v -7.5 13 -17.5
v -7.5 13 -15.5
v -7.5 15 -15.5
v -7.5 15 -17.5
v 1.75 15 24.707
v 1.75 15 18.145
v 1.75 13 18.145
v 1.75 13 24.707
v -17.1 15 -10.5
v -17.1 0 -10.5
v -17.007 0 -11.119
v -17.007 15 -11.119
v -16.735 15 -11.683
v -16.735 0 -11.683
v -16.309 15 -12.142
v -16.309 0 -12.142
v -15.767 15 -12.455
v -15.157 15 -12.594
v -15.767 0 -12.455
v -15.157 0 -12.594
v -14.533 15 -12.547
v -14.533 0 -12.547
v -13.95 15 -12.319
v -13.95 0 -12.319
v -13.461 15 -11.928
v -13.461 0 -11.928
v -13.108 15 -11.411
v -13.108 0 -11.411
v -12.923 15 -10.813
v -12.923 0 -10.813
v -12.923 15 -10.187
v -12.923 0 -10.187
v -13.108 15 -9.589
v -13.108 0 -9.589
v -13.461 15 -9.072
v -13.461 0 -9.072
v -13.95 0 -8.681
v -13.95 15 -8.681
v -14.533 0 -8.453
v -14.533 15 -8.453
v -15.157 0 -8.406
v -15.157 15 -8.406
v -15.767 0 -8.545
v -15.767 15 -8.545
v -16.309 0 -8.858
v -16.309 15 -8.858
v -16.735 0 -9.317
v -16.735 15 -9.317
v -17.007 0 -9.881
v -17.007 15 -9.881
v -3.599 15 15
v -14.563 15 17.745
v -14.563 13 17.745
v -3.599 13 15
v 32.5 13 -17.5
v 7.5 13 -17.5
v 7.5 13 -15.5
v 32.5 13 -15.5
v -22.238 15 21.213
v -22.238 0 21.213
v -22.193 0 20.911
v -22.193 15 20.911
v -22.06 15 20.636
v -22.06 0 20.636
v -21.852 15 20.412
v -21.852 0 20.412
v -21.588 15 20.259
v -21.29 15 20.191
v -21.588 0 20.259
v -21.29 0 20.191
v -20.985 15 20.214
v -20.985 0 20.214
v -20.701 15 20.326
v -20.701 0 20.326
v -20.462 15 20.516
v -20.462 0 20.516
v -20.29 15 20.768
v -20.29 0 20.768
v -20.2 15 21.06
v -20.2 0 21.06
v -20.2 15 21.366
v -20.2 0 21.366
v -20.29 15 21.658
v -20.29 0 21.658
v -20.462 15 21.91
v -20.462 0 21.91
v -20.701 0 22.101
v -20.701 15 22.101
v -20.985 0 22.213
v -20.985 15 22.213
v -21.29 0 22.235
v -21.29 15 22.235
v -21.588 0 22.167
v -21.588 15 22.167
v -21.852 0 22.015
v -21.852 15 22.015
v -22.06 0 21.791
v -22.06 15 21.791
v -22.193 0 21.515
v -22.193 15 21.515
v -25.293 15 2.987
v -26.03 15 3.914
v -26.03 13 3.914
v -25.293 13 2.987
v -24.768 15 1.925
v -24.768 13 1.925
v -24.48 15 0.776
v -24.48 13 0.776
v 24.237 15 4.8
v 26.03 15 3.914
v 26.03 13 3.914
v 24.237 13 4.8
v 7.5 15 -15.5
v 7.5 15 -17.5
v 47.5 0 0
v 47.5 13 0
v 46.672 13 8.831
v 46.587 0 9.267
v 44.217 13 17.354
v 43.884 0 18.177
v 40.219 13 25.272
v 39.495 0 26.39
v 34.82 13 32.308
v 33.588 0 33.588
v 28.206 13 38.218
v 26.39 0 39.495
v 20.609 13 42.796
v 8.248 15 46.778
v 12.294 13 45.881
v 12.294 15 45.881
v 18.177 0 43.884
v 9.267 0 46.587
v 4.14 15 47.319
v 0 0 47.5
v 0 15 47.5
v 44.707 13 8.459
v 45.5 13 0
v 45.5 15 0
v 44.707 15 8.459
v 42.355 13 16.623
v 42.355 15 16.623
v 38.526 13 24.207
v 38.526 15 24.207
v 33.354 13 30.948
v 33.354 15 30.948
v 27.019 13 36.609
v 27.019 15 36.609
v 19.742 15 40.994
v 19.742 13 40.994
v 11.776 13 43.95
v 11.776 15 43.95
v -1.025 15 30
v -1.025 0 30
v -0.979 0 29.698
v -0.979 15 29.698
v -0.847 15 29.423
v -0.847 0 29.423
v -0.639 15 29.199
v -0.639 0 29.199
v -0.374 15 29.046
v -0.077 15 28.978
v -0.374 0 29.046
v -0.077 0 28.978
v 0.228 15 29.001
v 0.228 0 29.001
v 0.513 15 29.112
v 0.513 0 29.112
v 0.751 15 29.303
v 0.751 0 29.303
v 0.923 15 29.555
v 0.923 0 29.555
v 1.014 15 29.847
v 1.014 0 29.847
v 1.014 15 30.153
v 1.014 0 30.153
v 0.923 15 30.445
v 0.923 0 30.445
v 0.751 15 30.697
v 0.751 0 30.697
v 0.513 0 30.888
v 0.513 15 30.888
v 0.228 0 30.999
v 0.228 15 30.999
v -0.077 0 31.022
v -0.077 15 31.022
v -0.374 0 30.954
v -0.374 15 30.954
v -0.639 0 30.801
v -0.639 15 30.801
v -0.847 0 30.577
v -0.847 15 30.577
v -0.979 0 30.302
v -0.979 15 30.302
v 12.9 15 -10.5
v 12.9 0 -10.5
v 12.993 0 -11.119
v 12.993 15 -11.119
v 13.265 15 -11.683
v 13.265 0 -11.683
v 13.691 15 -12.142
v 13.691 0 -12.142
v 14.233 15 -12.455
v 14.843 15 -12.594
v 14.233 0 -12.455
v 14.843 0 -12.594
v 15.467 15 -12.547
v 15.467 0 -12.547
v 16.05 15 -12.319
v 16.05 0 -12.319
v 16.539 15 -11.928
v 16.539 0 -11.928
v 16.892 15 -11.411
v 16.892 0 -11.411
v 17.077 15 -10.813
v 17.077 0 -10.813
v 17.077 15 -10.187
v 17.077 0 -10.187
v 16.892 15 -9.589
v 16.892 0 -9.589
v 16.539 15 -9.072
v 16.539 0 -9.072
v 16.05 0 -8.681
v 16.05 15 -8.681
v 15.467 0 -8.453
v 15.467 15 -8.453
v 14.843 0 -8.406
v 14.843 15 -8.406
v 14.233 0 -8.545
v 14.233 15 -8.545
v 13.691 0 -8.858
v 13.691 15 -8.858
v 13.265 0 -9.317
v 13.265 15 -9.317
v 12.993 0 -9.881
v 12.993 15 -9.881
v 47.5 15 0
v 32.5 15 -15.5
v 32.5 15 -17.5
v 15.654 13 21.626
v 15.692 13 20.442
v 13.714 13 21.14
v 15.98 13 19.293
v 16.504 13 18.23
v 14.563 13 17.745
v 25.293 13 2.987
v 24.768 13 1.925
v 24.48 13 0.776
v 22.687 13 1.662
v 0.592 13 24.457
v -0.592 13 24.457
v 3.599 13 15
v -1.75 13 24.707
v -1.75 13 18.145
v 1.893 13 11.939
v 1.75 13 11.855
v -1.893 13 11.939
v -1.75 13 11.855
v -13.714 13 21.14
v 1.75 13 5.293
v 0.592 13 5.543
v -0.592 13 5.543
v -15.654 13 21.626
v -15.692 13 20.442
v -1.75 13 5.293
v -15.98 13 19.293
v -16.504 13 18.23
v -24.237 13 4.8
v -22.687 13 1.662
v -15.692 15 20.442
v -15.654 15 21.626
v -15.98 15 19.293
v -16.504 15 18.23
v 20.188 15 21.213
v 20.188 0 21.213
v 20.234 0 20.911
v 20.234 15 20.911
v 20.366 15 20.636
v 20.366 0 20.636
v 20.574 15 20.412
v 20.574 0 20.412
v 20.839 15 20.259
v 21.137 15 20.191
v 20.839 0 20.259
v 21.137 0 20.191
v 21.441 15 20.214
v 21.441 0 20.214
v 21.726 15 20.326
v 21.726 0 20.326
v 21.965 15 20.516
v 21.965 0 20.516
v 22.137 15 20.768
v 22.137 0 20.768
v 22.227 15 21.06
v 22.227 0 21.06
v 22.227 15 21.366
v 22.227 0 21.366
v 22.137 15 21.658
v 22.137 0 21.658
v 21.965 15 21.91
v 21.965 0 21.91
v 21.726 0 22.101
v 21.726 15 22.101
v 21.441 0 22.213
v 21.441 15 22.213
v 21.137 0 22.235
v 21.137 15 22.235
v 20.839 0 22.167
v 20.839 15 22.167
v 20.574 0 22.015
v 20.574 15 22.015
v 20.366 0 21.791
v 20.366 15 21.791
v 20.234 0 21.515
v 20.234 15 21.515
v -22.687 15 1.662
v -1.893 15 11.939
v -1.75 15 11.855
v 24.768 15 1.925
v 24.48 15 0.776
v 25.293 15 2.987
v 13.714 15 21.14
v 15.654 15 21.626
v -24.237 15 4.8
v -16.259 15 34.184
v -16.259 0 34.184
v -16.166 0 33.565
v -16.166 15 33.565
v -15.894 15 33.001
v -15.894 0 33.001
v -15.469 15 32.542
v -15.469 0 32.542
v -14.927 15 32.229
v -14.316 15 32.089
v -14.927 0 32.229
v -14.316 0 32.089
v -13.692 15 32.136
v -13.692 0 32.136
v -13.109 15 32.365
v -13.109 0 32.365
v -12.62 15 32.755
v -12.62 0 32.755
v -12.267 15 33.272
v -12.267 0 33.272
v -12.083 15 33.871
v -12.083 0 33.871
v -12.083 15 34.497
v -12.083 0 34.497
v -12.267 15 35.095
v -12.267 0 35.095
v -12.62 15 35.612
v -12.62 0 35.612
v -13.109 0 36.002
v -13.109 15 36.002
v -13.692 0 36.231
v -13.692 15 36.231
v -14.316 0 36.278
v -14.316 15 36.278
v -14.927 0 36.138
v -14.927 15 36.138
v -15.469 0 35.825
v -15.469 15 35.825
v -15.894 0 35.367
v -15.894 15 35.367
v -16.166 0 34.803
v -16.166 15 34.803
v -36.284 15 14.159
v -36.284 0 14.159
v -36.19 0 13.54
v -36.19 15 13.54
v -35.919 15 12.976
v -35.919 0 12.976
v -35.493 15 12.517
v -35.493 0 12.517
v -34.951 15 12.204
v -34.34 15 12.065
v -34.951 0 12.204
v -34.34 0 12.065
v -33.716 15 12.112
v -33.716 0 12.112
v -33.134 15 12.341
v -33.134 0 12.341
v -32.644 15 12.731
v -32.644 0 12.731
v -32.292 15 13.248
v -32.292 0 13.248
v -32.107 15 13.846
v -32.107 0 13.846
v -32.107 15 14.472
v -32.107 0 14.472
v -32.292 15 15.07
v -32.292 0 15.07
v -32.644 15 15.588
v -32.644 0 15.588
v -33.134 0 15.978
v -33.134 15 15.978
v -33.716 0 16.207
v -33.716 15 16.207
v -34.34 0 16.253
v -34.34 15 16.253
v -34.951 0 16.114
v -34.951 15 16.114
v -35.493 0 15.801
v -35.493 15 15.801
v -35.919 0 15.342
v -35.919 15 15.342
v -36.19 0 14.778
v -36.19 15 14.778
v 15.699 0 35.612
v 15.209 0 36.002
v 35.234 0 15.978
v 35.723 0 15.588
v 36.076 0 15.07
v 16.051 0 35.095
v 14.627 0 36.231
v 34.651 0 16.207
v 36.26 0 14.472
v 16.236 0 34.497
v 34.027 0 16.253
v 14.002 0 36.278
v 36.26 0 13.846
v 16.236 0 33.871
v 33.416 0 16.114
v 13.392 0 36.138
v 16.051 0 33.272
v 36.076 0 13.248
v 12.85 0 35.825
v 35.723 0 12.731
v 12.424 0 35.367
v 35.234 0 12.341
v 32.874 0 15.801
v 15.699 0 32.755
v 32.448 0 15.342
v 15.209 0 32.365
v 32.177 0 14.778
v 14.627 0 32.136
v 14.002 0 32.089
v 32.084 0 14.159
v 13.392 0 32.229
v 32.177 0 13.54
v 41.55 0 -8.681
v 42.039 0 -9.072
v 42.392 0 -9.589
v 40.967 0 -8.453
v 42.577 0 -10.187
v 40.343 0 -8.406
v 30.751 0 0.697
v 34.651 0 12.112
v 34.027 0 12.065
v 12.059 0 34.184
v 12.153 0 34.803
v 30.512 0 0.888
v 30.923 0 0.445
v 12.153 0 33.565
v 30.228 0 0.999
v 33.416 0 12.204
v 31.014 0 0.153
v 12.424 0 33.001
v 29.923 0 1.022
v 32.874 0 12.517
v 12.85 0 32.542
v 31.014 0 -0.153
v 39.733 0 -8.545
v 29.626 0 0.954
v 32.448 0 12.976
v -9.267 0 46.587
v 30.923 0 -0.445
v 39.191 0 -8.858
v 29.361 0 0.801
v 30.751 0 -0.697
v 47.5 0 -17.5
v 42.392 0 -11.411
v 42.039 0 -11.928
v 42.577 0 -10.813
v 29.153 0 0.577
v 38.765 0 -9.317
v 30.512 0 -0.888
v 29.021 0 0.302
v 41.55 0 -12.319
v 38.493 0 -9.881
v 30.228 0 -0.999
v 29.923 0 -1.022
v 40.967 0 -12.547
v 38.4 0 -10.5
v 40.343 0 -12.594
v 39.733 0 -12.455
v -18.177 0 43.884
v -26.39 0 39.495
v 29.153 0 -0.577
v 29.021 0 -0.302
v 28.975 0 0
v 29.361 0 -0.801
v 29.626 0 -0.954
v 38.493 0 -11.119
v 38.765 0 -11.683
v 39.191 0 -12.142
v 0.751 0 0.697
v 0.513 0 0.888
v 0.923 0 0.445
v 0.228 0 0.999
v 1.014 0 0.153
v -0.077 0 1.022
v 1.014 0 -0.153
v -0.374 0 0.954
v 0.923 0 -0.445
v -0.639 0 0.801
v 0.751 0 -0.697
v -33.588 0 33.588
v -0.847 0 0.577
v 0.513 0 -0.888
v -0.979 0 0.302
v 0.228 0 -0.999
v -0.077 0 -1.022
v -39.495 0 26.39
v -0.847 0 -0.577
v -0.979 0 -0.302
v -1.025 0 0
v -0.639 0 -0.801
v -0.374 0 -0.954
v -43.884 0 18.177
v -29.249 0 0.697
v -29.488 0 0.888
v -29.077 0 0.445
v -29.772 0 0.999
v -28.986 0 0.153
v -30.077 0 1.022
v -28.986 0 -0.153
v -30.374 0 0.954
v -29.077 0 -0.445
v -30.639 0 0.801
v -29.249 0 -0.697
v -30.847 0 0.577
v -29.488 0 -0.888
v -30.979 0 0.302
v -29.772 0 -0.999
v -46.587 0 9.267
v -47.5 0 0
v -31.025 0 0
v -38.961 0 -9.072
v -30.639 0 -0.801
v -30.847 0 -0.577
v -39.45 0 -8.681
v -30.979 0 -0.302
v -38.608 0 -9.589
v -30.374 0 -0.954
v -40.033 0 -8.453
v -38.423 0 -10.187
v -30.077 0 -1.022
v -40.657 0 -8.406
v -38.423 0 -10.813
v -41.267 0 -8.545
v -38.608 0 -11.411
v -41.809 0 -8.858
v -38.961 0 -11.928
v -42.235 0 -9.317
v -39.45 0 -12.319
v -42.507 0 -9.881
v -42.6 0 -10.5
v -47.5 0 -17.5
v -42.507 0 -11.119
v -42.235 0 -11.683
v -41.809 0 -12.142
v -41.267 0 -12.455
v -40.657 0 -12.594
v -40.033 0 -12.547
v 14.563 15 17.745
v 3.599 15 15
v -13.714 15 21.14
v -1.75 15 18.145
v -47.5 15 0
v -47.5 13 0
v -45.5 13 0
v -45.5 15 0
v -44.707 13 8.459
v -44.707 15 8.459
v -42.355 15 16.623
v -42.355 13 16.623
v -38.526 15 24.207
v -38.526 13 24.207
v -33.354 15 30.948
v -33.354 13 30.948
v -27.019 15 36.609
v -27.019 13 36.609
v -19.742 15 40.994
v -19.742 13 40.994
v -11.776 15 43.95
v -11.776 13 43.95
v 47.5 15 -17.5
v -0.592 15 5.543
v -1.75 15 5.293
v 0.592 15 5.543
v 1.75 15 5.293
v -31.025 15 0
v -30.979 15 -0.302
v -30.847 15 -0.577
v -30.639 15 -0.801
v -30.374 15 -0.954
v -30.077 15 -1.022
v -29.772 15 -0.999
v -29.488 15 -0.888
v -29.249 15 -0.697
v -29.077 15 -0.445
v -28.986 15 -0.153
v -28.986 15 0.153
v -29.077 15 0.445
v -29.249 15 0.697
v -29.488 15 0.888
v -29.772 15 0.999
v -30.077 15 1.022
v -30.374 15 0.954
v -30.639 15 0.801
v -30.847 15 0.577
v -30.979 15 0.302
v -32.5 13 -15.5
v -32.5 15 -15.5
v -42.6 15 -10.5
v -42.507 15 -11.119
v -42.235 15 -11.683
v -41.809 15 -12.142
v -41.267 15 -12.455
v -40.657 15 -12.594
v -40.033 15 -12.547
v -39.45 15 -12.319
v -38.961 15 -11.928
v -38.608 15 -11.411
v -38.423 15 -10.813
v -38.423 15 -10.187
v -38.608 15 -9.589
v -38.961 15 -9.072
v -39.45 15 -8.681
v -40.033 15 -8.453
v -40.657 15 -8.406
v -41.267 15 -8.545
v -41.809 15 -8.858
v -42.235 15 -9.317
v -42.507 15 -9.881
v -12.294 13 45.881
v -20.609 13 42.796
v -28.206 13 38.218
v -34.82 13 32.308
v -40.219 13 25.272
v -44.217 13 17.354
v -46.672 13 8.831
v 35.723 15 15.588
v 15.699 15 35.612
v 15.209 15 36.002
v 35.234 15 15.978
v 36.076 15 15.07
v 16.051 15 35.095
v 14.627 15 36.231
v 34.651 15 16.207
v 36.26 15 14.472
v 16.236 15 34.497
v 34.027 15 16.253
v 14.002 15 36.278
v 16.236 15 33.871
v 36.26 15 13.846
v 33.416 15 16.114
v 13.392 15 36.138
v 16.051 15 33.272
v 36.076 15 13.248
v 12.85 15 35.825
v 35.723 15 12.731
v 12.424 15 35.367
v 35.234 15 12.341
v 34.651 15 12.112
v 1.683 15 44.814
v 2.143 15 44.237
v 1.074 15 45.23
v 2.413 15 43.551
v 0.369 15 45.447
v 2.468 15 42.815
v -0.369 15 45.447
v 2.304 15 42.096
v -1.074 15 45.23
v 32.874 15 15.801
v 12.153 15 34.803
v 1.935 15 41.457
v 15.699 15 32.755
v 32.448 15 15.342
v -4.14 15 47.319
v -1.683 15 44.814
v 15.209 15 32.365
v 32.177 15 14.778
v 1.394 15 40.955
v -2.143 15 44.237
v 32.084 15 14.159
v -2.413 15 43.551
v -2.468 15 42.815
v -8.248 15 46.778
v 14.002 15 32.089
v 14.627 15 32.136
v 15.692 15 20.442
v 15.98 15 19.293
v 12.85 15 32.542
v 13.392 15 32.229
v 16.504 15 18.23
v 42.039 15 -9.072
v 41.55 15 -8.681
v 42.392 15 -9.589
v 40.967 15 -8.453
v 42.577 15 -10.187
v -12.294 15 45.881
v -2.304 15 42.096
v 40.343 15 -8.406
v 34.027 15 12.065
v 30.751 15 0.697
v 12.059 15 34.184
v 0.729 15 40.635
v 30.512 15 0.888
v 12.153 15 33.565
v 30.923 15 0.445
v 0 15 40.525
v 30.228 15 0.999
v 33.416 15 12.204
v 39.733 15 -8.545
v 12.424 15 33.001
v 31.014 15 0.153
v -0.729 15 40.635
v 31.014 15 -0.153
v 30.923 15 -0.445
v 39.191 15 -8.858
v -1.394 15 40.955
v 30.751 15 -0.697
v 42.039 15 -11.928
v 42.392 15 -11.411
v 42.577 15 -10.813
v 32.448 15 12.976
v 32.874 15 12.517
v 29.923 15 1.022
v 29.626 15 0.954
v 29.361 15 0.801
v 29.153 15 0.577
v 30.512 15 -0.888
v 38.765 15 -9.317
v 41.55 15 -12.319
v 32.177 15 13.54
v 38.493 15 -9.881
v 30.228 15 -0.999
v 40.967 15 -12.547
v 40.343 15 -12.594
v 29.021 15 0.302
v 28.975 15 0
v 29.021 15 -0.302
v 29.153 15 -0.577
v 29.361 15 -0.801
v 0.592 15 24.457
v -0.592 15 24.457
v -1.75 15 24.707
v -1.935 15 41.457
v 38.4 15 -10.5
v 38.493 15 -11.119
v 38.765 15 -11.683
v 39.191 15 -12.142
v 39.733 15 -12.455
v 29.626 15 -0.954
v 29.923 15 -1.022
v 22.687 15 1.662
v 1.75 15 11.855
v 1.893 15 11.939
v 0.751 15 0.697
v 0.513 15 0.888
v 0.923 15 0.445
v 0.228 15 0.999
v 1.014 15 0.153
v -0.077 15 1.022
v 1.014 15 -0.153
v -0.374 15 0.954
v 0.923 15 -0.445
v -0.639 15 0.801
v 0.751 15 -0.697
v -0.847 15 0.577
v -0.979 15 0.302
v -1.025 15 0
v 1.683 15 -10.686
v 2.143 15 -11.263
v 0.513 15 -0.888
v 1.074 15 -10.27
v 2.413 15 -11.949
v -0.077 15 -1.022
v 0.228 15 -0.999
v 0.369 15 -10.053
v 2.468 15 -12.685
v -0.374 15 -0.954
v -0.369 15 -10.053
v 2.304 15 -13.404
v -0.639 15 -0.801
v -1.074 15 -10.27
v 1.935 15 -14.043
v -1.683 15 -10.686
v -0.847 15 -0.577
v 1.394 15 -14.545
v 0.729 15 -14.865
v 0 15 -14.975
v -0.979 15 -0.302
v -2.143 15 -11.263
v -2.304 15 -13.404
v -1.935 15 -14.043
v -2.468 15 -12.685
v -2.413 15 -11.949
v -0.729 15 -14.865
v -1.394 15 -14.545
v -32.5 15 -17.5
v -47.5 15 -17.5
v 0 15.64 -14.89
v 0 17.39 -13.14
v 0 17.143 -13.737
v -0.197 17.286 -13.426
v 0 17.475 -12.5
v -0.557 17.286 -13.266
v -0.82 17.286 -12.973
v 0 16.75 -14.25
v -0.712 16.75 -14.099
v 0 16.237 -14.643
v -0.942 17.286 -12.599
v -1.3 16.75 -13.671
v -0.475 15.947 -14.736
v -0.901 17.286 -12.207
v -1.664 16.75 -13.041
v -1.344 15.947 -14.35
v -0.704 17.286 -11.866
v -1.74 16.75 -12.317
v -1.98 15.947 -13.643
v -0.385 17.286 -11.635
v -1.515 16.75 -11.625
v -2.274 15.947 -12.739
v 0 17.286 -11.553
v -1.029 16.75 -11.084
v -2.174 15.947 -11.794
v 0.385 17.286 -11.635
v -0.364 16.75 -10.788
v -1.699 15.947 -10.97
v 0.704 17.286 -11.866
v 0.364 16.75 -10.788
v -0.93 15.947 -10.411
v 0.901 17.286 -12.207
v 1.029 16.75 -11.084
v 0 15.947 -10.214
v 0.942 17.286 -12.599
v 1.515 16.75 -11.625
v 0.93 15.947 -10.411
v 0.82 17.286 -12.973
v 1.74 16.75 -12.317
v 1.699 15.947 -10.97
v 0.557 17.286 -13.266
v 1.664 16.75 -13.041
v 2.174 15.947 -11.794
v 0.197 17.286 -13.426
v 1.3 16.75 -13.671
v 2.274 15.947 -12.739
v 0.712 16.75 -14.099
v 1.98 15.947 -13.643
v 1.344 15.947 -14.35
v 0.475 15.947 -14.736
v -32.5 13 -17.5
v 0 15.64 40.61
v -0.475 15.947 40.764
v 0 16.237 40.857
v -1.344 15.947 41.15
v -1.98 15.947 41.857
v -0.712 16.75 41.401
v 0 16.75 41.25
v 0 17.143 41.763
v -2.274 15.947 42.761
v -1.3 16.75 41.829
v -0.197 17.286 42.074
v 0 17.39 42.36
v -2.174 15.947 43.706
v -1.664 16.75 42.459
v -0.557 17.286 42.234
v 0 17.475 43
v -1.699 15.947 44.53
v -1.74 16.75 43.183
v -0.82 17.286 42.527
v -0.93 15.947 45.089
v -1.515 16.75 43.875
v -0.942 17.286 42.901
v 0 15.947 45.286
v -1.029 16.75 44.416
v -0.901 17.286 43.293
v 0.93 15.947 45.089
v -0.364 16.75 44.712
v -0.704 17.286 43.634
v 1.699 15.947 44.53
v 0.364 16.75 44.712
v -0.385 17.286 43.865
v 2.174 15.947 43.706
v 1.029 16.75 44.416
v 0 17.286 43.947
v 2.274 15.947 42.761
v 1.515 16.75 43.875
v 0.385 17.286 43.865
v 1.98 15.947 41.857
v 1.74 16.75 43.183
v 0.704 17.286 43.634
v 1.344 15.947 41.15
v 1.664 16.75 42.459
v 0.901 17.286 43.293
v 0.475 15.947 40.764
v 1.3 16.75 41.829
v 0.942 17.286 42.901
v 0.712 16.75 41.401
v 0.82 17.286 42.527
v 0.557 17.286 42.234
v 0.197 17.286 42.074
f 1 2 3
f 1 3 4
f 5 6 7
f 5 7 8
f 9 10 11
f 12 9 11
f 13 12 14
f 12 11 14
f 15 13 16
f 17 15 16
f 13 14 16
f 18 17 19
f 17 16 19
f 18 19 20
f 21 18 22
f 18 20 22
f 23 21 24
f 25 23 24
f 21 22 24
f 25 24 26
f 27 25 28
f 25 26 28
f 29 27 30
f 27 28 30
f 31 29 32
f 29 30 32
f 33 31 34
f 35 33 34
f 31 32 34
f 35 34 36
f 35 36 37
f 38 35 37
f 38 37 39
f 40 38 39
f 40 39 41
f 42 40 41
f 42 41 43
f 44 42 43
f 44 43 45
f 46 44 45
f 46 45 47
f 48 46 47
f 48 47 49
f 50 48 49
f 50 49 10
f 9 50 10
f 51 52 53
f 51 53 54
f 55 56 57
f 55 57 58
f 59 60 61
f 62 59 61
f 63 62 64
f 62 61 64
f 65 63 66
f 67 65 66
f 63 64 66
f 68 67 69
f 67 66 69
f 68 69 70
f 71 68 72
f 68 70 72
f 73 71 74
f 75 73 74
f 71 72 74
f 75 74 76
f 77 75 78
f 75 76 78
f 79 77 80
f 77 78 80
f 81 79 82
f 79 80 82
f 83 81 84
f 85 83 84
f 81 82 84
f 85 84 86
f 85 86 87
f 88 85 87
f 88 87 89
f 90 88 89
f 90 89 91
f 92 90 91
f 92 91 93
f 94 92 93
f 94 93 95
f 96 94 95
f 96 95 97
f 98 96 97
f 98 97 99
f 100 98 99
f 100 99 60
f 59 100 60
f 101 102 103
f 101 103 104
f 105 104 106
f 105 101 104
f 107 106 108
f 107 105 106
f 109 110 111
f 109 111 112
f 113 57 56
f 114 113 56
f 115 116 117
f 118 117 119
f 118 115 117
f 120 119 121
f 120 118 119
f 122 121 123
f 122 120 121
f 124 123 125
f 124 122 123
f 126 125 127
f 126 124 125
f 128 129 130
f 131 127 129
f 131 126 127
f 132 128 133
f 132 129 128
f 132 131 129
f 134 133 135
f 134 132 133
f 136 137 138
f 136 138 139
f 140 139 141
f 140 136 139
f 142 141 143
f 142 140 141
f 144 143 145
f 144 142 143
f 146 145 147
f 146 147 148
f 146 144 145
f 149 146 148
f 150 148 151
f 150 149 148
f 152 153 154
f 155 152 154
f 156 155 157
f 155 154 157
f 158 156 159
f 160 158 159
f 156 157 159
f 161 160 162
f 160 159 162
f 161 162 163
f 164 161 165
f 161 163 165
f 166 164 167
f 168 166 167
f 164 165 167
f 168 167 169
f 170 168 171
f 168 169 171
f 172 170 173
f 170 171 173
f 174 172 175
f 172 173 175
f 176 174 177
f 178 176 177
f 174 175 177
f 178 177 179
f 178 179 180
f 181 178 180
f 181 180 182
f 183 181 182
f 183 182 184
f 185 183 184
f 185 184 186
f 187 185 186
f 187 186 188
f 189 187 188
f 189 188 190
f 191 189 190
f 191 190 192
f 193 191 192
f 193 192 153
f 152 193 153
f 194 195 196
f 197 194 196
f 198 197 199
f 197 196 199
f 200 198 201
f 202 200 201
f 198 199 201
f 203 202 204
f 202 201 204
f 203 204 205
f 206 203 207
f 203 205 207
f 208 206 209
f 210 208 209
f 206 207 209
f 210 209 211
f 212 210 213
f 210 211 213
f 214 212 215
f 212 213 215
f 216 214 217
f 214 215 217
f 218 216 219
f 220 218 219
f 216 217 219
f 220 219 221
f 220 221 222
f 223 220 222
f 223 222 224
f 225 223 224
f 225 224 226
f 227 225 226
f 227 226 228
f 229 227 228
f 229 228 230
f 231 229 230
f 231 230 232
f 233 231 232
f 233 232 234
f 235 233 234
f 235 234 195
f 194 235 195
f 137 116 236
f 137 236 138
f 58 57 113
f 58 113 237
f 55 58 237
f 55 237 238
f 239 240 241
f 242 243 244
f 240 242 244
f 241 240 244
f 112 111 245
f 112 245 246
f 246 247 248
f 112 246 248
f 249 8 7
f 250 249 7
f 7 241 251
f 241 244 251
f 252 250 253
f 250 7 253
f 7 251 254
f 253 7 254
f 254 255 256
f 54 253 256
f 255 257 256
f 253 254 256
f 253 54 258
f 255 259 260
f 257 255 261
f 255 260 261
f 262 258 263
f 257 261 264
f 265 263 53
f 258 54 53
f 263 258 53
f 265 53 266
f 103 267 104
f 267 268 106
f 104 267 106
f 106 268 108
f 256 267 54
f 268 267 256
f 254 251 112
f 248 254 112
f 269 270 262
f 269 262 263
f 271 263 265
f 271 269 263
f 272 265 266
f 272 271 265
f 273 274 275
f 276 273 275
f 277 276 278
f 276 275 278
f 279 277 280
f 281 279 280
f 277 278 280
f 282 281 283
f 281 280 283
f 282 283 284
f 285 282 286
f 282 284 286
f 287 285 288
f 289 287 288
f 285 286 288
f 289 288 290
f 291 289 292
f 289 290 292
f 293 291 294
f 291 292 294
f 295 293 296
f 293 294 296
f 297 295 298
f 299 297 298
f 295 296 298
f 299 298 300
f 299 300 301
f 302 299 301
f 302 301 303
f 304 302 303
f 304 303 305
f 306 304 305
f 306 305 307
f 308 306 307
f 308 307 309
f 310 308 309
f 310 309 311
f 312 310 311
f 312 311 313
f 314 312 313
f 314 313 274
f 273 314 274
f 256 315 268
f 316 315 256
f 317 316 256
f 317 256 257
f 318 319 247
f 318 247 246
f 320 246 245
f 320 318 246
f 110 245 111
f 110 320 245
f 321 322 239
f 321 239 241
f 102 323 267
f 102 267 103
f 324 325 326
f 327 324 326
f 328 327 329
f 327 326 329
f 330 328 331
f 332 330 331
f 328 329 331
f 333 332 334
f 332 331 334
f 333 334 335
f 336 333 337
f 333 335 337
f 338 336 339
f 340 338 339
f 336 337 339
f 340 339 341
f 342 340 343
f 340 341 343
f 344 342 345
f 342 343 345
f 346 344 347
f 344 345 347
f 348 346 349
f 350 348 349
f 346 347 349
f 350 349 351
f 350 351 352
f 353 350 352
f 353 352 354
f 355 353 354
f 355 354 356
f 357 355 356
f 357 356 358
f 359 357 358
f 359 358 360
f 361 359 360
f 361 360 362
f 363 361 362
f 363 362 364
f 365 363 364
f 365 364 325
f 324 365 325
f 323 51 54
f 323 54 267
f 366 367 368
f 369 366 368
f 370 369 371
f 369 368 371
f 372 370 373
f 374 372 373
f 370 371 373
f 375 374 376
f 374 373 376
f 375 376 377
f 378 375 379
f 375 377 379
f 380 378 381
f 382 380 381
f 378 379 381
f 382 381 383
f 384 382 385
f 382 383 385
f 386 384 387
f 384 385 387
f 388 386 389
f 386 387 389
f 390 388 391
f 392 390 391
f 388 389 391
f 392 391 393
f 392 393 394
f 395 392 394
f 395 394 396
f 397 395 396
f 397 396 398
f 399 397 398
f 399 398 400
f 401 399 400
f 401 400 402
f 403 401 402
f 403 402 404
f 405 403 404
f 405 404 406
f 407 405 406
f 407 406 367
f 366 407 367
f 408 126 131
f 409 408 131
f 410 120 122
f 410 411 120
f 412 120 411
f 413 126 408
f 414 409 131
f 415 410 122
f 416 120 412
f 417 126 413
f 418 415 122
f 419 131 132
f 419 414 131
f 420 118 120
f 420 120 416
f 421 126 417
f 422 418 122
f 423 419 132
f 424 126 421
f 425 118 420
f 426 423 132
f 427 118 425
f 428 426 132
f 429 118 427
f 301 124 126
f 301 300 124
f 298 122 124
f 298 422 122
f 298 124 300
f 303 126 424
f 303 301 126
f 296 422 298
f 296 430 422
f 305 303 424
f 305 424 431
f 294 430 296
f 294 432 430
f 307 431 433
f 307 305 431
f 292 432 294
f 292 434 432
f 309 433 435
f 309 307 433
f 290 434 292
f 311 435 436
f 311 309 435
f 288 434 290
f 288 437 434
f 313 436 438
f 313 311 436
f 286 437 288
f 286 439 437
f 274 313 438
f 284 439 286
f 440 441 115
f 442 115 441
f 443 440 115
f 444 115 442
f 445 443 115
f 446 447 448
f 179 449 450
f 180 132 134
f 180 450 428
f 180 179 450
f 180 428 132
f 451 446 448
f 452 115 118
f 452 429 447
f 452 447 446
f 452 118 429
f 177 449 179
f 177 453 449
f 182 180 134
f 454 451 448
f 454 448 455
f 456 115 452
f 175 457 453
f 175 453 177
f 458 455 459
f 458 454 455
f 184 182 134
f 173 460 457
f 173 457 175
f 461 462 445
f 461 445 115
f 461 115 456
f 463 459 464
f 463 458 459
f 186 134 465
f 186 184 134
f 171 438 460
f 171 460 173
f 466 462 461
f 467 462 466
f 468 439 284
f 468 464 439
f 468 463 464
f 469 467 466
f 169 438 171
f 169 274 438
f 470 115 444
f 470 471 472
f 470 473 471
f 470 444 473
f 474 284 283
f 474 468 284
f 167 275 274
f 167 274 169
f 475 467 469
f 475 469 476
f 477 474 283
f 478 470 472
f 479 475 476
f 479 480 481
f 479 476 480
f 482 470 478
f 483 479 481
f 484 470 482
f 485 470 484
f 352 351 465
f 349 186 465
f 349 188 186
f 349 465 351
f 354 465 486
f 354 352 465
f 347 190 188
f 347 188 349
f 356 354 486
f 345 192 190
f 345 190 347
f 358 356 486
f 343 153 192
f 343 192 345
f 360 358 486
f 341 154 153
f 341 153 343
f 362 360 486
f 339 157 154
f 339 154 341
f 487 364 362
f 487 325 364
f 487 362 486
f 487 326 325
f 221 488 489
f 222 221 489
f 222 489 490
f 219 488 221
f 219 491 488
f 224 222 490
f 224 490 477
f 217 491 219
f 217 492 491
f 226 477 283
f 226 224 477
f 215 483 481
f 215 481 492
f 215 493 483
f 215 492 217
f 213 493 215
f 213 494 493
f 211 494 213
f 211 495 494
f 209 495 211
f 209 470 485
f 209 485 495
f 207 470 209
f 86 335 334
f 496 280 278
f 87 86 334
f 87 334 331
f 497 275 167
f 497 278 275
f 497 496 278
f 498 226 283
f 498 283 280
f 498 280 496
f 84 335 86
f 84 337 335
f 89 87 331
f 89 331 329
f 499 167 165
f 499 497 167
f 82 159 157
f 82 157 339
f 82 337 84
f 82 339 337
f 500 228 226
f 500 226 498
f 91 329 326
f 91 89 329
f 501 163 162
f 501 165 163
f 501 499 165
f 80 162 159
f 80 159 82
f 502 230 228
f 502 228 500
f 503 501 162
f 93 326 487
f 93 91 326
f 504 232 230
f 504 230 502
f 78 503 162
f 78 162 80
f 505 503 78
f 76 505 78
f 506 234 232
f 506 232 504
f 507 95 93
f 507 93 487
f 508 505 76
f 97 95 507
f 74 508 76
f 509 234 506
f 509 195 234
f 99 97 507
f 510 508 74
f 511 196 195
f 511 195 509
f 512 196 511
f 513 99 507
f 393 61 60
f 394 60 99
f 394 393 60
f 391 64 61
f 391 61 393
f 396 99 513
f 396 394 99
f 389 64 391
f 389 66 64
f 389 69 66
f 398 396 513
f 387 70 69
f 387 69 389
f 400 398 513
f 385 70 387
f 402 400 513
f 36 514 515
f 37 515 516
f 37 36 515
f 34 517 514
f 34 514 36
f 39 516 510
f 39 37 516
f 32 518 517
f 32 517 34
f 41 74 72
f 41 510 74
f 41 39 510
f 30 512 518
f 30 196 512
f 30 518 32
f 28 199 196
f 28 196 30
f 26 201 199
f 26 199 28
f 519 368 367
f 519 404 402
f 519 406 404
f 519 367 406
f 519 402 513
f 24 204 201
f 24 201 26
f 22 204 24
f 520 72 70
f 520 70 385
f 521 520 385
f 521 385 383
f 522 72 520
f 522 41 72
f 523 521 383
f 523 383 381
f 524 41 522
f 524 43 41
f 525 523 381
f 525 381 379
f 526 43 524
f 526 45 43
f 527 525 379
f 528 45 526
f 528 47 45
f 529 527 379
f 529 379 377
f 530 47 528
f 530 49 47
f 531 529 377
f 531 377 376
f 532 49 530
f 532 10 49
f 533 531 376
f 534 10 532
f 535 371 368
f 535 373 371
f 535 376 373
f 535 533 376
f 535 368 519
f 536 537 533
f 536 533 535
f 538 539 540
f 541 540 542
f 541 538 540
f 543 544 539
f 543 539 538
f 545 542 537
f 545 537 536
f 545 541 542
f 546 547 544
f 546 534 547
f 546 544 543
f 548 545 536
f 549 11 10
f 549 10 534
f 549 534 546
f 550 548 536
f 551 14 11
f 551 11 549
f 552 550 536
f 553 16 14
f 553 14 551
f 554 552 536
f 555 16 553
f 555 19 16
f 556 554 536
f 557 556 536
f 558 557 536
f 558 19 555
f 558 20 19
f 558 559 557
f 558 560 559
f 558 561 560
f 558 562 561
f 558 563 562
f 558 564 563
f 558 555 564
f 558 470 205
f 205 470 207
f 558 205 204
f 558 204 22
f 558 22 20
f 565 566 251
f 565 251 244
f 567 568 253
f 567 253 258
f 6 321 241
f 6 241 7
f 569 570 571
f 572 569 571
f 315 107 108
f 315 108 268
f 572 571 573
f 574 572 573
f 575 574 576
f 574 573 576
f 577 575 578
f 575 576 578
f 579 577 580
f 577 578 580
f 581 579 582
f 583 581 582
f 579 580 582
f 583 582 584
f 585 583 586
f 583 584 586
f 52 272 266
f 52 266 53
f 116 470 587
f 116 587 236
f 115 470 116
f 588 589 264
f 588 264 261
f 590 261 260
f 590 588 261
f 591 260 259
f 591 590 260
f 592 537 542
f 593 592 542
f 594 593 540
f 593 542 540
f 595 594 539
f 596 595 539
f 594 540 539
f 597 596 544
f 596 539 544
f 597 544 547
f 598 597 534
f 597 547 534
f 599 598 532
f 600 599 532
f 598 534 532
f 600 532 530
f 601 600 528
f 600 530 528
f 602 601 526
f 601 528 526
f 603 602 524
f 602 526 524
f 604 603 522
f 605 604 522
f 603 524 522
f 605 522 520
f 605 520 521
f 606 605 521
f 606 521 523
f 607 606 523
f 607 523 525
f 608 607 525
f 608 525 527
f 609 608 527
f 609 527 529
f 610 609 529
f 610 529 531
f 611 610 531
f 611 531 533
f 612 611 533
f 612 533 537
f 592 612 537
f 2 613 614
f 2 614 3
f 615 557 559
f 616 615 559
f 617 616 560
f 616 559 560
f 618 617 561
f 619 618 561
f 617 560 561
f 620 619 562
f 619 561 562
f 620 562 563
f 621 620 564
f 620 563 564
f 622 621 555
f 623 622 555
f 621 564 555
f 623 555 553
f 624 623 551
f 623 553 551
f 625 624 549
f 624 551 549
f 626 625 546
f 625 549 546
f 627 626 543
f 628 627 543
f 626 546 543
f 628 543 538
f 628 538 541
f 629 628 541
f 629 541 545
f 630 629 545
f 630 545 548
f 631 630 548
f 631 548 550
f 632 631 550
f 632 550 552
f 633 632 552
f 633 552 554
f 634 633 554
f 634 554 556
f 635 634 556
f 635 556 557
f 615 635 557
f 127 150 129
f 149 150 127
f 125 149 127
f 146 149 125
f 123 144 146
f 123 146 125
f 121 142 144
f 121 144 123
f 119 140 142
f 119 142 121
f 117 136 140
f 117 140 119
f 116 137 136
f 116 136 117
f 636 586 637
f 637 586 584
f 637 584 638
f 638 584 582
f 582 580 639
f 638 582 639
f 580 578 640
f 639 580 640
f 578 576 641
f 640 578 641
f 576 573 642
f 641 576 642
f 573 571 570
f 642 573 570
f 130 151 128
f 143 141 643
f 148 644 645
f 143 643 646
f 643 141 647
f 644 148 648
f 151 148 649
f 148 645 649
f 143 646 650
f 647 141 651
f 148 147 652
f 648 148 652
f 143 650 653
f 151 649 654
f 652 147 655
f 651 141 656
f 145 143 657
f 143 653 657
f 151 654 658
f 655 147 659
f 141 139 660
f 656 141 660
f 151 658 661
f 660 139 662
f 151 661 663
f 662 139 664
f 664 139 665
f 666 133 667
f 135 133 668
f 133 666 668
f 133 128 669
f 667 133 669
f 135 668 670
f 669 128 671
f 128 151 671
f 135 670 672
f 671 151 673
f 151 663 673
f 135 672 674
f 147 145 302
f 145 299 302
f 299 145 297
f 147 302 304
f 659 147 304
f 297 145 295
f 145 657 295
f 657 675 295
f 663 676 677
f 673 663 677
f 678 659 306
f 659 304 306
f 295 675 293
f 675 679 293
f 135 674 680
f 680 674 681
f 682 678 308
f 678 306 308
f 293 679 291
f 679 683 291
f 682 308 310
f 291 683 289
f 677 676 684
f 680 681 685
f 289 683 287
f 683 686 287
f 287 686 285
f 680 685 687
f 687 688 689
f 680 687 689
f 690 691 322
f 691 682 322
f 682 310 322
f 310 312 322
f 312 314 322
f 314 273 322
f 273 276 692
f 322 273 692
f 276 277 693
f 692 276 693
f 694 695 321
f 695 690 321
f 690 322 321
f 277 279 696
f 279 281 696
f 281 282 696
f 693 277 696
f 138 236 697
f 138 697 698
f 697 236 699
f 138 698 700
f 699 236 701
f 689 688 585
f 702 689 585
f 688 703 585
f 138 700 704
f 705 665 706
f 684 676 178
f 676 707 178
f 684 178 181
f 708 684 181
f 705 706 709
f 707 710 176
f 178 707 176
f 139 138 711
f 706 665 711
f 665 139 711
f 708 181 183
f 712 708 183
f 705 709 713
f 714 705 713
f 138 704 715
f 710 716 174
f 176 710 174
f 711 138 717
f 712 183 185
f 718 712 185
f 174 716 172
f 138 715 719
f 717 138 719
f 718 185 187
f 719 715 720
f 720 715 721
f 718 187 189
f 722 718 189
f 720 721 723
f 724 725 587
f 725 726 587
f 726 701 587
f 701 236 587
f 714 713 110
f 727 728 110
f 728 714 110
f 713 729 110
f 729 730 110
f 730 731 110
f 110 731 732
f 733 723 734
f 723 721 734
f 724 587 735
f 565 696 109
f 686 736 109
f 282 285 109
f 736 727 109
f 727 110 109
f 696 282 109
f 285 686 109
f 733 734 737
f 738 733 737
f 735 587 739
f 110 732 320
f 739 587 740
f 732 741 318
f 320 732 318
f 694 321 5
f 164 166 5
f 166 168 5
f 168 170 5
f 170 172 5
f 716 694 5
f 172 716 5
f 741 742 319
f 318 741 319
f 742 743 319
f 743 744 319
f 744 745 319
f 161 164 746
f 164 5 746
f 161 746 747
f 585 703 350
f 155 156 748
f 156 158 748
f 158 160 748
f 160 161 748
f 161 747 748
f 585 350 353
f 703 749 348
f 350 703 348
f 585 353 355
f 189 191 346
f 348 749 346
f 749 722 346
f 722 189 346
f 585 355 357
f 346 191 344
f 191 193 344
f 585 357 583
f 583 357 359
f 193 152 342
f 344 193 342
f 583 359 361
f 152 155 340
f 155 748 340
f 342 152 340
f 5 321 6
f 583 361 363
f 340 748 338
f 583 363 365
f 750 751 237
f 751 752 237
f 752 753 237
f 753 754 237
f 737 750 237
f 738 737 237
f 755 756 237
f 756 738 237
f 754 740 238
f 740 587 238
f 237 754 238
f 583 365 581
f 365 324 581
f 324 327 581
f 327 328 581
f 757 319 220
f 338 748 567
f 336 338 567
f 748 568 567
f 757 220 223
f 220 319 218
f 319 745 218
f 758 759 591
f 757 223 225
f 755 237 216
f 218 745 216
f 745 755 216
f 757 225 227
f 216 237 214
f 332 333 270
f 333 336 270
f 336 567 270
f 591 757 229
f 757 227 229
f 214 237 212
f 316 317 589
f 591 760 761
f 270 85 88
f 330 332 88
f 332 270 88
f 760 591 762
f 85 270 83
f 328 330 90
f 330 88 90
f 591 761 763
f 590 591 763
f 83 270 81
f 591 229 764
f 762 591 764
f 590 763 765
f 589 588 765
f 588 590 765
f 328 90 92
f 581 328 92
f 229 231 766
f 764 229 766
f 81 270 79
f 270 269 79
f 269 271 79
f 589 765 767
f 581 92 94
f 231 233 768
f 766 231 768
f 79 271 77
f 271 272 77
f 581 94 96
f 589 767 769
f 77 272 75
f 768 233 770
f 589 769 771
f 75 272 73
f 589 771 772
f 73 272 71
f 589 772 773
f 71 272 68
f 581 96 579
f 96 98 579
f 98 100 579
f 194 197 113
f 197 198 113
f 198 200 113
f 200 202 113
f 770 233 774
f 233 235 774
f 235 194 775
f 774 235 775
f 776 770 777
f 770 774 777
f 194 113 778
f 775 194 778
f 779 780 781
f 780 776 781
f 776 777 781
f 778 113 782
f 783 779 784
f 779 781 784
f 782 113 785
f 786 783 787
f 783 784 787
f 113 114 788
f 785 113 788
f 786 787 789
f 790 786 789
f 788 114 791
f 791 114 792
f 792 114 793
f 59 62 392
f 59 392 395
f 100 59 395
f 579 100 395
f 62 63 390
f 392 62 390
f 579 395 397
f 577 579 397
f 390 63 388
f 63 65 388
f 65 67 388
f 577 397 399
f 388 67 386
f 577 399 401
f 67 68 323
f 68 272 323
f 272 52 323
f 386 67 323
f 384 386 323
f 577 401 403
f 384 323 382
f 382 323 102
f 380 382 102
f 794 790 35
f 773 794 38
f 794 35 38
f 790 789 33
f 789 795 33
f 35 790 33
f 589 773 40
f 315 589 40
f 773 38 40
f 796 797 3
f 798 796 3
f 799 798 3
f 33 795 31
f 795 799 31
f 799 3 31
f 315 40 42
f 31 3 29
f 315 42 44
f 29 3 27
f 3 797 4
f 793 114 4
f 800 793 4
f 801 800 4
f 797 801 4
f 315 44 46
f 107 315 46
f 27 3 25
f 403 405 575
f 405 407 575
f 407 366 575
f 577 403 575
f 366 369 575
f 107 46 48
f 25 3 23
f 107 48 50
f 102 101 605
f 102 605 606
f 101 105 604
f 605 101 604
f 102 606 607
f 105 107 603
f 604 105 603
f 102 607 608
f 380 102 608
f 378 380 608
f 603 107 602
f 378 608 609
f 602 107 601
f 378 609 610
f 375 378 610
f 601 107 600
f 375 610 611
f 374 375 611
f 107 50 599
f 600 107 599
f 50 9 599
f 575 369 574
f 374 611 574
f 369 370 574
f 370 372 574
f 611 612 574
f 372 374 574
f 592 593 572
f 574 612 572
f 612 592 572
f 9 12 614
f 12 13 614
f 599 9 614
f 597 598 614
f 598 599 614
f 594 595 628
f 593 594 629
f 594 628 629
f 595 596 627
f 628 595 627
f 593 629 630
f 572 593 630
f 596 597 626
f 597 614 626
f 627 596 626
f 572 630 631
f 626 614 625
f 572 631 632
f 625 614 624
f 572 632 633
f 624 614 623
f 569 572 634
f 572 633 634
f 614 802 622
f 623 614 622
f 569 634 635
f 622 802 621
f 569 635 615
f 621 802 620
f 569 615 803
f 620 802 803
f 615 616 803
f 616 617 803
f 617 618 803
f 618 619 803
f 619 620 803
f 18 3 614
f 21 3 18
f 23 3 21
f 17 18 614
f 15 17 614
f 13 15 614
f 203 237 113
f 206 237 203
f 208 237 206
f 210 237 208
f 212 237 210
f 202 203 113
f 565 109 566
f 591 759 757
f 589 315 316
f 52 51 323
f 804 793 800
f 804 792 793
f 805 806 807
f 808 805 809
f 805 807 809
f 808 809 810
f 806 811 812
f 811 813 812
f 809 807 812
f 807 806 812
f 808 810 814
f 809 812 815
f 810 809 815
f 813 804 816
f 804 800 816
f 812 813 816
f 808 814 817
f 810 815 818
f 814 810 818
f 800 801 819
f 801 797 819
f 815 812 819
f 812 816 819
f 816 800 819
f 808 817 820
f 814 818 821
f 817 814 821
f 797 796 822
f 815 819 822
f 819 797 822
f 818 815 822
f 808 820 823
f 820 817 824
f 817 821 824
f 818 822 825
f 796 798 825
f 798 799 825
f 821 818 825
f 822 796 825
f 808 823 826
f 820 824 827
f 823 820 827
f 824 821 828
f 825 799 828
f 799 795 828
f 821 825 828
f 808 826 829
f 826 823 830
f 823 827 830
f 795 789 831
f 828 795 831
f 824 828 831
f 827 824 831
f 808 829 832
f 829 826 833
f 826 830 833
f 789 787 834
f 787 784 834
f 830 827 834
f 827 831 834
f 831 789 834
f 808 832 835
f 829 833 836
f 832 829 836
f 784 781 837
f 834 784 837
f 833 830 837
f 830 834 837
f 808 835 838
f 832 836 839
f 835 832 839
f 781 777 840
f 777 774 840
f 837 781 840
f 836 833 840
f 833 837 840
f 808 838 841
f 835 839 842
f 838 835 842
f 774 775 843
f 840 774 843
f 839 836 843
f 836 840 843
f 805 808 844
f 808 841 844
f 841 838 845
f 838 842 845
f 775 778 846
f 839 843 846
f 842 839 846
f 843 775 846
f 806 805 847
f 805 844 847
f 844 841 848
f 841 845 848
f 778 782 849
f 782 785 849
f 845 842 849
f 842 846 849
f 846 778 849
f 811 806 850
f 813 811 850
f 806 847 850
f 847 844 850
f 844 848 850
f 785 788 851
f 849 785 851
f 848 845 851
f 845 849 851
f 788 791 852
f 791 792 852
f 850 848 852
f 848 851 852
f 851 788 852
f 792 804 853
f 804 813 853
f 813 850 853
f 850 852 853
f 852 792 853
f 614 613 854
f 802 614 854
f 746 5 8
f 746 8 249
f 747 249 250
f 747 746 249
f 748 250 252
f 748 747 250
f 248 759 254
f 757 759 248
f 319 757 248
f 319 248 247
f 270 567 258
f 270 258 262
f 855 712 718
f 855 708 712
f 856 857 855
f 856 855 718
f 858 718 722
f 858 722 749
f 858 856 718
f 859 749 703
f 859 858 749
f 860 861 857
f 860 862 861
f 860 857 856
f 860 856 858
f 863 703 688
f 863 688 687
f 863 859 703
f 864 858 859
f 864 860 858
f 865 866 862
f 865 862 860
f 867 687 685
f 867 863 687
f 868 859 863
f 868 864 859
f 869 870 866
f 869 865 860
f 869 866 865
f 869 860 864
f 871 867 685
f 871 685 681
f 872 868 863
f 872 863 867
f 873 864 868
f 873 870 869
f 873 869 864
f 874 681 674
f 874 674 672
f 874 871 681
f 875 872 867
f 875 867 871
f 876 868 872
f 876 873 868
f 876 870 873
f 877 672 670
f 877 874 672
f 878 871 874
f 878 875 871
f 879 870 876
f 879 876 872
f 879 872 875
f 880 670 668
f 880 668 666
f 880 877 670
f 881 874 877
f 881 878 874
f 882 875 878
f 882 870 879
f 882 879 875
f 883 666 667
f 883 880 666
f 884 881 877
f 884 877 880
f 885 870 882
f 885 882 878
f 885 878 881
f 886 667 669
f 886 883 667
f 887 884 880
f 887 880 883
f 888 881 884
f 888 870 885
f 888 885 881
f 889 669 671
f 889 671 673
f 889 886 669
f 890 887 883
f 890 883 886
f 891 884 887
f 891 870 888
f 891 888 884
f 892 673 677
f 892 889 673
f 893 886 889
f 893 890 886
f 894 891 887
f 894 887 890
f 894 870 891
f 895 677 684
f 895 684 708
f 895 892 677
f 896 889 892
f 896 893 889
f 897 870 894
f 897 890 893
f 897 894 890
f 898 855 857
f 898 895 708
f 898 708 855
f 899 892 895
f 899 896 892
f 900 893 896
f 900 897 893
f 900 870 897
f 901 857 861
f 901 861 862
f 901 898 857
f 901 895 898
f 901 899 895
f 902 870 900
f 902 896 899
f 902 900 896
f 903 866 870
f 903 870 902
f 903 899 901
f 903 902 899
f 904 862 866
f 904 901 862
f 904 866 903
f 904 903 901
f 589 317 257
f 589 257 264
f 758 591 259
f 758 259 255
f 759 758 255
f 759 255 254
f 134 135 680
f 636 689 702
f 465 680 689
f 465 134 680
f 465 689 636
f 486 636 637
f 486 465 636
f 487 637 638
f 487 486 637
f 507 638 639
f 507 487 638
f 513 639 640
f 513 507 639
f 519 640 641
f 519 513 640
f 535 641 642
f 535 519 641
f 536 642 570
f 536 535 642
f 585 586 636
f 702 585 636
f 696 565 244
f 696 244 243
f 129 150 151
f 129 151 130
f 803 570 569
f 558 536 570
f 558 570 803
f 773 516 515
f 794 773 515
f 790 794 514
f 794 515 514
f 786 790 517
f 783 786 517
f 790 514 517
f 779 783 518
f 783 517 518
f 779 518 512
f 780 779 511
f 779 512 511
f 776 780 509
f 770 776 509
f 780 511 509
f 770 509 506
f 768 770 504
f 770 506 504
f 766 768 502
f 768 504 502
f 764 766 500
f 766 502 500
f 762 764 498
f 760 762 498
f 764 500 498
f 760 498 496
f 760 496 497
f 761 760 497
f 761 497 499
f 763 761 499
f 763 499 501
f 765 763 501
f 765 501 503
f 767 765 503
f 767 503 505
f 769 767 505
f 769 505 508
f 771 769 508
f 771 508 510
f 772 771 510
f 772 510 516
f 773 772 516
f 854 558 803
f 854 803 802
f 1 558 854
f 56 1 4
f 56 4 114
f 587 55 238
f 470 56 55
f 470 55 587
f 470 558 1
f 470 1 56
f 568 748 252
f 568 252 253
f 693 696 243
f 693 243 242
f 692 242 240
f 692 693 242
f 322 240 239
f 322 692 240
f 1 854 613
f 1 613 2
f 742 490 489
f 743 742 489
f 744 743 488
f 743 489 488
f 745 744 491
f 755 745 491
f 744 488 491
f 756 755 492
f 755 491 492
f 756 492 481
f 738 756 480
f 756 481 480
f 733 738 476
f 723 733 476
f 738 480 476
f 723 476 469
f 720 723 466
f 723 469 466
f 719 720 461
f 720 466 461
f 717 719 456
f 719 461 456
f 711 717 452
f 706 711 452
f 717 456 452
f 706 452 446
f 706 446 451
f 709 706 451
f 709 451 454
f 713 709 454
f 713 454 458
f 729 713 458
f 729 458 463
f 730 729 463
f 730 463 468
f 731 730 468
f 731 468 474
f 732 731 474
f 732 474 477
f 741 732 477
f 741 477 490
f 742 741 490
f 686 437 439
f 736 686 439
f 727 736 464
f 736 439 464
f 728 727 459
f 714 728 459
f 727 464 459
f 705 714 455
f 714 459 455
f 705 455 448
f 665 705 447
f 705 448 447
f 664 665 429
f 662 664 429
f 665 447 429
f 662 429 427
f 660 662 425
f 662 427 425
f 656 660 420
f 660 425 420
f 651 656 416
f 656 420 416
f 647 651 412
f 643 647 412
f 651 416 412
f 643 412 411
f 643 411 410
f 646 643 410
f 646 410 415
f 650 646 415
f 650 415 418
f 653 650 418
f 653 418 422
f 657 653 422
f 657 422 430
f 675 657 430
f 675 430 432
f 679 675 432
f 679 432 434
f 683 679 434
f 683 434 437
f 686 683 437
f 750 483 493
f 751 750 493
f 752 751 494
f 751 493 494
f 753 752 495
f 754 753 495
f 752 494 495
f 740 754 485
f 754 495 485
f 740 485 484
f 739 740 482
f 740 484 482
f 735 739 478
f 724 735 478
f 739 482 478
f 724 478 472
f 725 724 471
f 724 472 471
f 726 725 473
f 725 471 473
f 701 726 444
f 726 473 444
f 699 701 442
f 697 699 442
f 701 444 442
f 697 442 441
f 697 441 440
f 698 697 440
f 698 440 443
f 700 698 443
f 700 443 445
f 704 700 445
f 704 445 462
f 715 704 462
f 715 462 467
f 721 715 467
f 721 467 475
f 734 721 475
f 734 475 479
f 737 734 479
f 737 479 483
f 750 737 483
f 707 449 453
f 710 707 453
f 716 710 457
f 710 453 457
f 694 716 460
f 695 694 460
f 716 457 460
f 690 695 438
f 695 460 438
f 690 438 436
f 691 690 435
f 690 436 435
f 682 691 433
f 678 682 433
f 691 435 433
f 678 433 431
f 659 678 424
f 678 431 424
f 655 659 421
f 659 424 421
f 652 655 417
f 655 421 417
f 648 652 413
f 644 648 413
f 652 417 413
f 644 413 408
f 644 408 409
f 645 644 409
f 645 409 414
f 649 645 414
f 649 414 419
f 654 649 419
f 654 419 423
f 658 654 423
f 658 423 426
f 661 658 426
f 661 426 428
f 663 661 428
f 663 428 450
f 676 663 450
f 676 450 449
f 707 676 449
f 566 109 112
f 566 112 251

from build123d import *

# Parameters (mm, degrees)
BOSS_EXTRUDE1_DEPTH      = 15
CUT_EXTRUDE1_DEPTH       = 2
M2_5X0_45_TAPPED_HOLE1_D = 2.05
CUT_EXTRUDE2_START       = -2
SKETCH9_W                = 25
SKETCH9_H                = 2
CUT_EXTRUDE2_DEPTH       = 2
M5X0_8_TAPPED_HOLE1_D    = 4.2


with BuildPart() as part:
    # Sketch1 → Boss-Extrude1 (new body)
    with BuildSketch(Plane(origin=(0, 0, 0), x_dir=(1, 0, 0), z_dir=(0, 1, 0))):
        with BuildLine():
            Line((-47.5, 17.5), (47.5, 17.5))
            Line((47.5, 17.5), (47.5, 0))
            ThreePointArc((47.5, 0), (33.587572106, -33.587572106), (0, -47.5))
            ThreePointArc((0, -47.5), (-33.587572106, -33.587572106), (-47.5, 0))
            Line((-47.5, 0), (-47.5, 17.5))
        make_face()
    extrude(amount=BOSS_EXTRUDE1_DEPTH)

    # Sketch2 → Cut-Extrude1 (cut)
    with BuildSketch(Plane(origin=(0, 15, 0), x_dir=(1, 0, 0), z_dir=(0, 1, 0))):
        with BuildLine():
            Line((13.71356205, -21.139861194), (1.75, -18.14509732))
            Line((1.75, -18.14509732), (1.75, -22.707023927))
            Line((1.75, -22.707023927), (1.75, -24.707023927))
            ThreePointArc((1.75, -24.707023927), (0, -24.425226847), (-1.75, -24.707023927))
            Line((-1.75, -24.707023927), (-1.75, -22.707023927))
            Line((-1.75, -22.707023927), (-1.75, -18.14509732))
            Line((-1.75, -18.14509732), (-13.71356205, -21.139861194))
            Line((-13.71356205, -21.139861194), (-15.653699161, -21.625523616))
            ThreePointArc((-15.653699161, -21.625523616), (-15.805291295, -19.859474518), (-16.503608401, -18.230283671))
            Line((-16.503608401, -18.230283671), (-14.56347129, -17.744621249))
            Line((-14.56347129, -17.744621249), (-3.599185624, -15))
            Line((-3.599185624, -15), (-24.237297726, -4.800131508))
            Line((-24.237297726, -4.800131508), (-26.03027479, -3.913997633))
            ThreePointArc((-26.03027479, -3.913997633), (-25.002279798, -2.469997671), (-24.479540508, -0.77628777))
            Line((-24.479540508, -0.77628777), (-22.686563443, -1.662421645))
            Line((-22.686563443, -1.662421645), (-1.893248081, -11.93899545))
            Line((-1.893248081, -11.93899545), (-1.75, -11.85490268))
            Line((-1.75, -11.85490268), (-1.75, -7.292976073))
            Line((-1.75, -7.292976073), (-1.75, -5.292976073))
            ThreePointArc((-1.75, -5.292976073), (0, -5.574773153), (1.75, -5.292976073))
            Line((1.75, -5.292976073), (1.75, -7.292976073))
            Line((1.75, -7.292976073), (1.75, -11.85490268))
            Line((1.75, -11.85490268), (1.893248081, -11.93899545))
            Line((1.893248081, -11.93899545), (22.686563443, -1.662421645))
            Line((22.686563443, -1.662421645), (24.479540508, -0.77628777))
            ThreePointArc((24.479540508, -0.77628777), (25.002279798, -2.469997671), (26.03027479, -3.913997633))
            Line((26.03027479, -3.913997633), (24.237297726, -4.800131508))
            Line((24.237297726, -4.800131508), (3.599185624, -15))
            Line((3.599185624, -15), (14.56347129, -17.744621249))
            Line((14.56347129, -17.744621249), (16.503608401, -18.230283671))
            ThreePointArc((16.503608401, -18.230283671), (15.805291295, -19.859474518), (15.653699161, -21.625523616))
            Line((15.653699161, -21.625523616), (13.71356205, -21.139861194))
        make_face()
    extrude(amount=-CUT_EXTRUDE1_DEPTH, mode=Mode.SUBTRACT)

    # M2.5x0.45 Tapped Hole1 (through all)
    with Locations(Plane(origin=(0, 15, 0), x_dir=(1, 0, 0), z_dir=(0, 1, 0))):
        with Locations((-30, 0), (0, 0), (30, 0), (21.213203436, -21.213203436), (0, -30), (-21.213203436, -21.213203436)):
            Hole(M2_5X0_45_TAPPED_HOLE1_D / 2)

    # Sketch9 → Cut-Extrude2 (cut)
    with BuildSketch(Plane(origin=(0, 15, 0), x_dir=(1, 0, 0), z_dir=(0, 1, 0)).offset(CUT_EXTRUDE2_START)):
        with Locations((-20, 16.5)):
            Rectangle(SKETCH9_W, SKETCH9_H)
        with Locations((20, 16.5)):
            Rectangle(SKETCH9_W, SKETCH9_H)
        with BuildLine():
            Line((11.776266552, -43.949625096), (12.293904642, -45.881476749))
            ThreePointArc((12.293904642, -45.881476749), (37.684283664, -28.916167878), (47.5, 0))
            Line((47.5, 0), (45.5, 0))
            ThreePointArc((45.5, 0), (36.097576983, -27.69864502), (11.776266552, -43.949625096))
        make_face()
        with BuildLine():
            Line((-47.5, 0), (-45.5, 0))
            ThreePointArc((-45.5, 0), (-36.097576983, -27.69864502), (-11.776266552, -43.949625096))
            Line((-11.776266552, -43.949625096), (-12.293904642, -45.881476749))
            ThreePointArc((-12.293904642, -45.881476749), (-37.684283664, -28.916167878), (-47.5, 0))
        make_face()
    extrude(amount=CUT_EXTRUDE2_DEPTH, mode=Mode.SUBTRACT)

    # M5x0.8 Tapped Hole1 (through all)
    with Locations(Plane(origin=(0, 15, 0), x_dir=(1, 0, 0), z_dir=(0, 1, 0))):
        with Locations((-40.5, 10.5), (-34.183542703, -14.159286998), (34.183542703, -14.159286998), (-14.159286998, -34.183542703), (14.159286998, -34.183542703), (40.5, 10.5), (-15, 10.5), (15, 10.5)):
            Hole(M5X0_8_TAPPED_HOLE1_D / 2)

    # Sketch15 → Revolve2 (revolve)
    with BuildSketch(Plane(origin=(0, 0, 0), x_dir=(0, 0, -1), z_dir=(1, 0, 0))):
        with BuildLine():
            Line((-43, 17.4746), (-43, 15))
            Line((-43, 15), (-40.5254, 15))
            ThreePointArc((-40.5254, 15), (-41.250193559, 16.749806441), (-43, 17.4746))
        make_face()
    revolve(axis=Axis((0, 15, 43), (0, 1, 0)))

    # Sketch17 → Revolve3 (revolve)
    with BuildSketch(Plane(origin=(0, 0, 0), x_dir=(0, 0, -1), z_dir=(1, 0, 0))):
        with BuildLine():
            Line((14.9746, 15), (12.5, 15))
            Line((12.5, 15), (12.5, 17.4746))
            ThreePointArc((12.5, 17.4746), (14.249806441, 16.749806441), (14.9746, 15))
        make_face()
    revolve(axis=Axis((0, 15, -12.5), (0, 1, 0)))


solid = part.part
